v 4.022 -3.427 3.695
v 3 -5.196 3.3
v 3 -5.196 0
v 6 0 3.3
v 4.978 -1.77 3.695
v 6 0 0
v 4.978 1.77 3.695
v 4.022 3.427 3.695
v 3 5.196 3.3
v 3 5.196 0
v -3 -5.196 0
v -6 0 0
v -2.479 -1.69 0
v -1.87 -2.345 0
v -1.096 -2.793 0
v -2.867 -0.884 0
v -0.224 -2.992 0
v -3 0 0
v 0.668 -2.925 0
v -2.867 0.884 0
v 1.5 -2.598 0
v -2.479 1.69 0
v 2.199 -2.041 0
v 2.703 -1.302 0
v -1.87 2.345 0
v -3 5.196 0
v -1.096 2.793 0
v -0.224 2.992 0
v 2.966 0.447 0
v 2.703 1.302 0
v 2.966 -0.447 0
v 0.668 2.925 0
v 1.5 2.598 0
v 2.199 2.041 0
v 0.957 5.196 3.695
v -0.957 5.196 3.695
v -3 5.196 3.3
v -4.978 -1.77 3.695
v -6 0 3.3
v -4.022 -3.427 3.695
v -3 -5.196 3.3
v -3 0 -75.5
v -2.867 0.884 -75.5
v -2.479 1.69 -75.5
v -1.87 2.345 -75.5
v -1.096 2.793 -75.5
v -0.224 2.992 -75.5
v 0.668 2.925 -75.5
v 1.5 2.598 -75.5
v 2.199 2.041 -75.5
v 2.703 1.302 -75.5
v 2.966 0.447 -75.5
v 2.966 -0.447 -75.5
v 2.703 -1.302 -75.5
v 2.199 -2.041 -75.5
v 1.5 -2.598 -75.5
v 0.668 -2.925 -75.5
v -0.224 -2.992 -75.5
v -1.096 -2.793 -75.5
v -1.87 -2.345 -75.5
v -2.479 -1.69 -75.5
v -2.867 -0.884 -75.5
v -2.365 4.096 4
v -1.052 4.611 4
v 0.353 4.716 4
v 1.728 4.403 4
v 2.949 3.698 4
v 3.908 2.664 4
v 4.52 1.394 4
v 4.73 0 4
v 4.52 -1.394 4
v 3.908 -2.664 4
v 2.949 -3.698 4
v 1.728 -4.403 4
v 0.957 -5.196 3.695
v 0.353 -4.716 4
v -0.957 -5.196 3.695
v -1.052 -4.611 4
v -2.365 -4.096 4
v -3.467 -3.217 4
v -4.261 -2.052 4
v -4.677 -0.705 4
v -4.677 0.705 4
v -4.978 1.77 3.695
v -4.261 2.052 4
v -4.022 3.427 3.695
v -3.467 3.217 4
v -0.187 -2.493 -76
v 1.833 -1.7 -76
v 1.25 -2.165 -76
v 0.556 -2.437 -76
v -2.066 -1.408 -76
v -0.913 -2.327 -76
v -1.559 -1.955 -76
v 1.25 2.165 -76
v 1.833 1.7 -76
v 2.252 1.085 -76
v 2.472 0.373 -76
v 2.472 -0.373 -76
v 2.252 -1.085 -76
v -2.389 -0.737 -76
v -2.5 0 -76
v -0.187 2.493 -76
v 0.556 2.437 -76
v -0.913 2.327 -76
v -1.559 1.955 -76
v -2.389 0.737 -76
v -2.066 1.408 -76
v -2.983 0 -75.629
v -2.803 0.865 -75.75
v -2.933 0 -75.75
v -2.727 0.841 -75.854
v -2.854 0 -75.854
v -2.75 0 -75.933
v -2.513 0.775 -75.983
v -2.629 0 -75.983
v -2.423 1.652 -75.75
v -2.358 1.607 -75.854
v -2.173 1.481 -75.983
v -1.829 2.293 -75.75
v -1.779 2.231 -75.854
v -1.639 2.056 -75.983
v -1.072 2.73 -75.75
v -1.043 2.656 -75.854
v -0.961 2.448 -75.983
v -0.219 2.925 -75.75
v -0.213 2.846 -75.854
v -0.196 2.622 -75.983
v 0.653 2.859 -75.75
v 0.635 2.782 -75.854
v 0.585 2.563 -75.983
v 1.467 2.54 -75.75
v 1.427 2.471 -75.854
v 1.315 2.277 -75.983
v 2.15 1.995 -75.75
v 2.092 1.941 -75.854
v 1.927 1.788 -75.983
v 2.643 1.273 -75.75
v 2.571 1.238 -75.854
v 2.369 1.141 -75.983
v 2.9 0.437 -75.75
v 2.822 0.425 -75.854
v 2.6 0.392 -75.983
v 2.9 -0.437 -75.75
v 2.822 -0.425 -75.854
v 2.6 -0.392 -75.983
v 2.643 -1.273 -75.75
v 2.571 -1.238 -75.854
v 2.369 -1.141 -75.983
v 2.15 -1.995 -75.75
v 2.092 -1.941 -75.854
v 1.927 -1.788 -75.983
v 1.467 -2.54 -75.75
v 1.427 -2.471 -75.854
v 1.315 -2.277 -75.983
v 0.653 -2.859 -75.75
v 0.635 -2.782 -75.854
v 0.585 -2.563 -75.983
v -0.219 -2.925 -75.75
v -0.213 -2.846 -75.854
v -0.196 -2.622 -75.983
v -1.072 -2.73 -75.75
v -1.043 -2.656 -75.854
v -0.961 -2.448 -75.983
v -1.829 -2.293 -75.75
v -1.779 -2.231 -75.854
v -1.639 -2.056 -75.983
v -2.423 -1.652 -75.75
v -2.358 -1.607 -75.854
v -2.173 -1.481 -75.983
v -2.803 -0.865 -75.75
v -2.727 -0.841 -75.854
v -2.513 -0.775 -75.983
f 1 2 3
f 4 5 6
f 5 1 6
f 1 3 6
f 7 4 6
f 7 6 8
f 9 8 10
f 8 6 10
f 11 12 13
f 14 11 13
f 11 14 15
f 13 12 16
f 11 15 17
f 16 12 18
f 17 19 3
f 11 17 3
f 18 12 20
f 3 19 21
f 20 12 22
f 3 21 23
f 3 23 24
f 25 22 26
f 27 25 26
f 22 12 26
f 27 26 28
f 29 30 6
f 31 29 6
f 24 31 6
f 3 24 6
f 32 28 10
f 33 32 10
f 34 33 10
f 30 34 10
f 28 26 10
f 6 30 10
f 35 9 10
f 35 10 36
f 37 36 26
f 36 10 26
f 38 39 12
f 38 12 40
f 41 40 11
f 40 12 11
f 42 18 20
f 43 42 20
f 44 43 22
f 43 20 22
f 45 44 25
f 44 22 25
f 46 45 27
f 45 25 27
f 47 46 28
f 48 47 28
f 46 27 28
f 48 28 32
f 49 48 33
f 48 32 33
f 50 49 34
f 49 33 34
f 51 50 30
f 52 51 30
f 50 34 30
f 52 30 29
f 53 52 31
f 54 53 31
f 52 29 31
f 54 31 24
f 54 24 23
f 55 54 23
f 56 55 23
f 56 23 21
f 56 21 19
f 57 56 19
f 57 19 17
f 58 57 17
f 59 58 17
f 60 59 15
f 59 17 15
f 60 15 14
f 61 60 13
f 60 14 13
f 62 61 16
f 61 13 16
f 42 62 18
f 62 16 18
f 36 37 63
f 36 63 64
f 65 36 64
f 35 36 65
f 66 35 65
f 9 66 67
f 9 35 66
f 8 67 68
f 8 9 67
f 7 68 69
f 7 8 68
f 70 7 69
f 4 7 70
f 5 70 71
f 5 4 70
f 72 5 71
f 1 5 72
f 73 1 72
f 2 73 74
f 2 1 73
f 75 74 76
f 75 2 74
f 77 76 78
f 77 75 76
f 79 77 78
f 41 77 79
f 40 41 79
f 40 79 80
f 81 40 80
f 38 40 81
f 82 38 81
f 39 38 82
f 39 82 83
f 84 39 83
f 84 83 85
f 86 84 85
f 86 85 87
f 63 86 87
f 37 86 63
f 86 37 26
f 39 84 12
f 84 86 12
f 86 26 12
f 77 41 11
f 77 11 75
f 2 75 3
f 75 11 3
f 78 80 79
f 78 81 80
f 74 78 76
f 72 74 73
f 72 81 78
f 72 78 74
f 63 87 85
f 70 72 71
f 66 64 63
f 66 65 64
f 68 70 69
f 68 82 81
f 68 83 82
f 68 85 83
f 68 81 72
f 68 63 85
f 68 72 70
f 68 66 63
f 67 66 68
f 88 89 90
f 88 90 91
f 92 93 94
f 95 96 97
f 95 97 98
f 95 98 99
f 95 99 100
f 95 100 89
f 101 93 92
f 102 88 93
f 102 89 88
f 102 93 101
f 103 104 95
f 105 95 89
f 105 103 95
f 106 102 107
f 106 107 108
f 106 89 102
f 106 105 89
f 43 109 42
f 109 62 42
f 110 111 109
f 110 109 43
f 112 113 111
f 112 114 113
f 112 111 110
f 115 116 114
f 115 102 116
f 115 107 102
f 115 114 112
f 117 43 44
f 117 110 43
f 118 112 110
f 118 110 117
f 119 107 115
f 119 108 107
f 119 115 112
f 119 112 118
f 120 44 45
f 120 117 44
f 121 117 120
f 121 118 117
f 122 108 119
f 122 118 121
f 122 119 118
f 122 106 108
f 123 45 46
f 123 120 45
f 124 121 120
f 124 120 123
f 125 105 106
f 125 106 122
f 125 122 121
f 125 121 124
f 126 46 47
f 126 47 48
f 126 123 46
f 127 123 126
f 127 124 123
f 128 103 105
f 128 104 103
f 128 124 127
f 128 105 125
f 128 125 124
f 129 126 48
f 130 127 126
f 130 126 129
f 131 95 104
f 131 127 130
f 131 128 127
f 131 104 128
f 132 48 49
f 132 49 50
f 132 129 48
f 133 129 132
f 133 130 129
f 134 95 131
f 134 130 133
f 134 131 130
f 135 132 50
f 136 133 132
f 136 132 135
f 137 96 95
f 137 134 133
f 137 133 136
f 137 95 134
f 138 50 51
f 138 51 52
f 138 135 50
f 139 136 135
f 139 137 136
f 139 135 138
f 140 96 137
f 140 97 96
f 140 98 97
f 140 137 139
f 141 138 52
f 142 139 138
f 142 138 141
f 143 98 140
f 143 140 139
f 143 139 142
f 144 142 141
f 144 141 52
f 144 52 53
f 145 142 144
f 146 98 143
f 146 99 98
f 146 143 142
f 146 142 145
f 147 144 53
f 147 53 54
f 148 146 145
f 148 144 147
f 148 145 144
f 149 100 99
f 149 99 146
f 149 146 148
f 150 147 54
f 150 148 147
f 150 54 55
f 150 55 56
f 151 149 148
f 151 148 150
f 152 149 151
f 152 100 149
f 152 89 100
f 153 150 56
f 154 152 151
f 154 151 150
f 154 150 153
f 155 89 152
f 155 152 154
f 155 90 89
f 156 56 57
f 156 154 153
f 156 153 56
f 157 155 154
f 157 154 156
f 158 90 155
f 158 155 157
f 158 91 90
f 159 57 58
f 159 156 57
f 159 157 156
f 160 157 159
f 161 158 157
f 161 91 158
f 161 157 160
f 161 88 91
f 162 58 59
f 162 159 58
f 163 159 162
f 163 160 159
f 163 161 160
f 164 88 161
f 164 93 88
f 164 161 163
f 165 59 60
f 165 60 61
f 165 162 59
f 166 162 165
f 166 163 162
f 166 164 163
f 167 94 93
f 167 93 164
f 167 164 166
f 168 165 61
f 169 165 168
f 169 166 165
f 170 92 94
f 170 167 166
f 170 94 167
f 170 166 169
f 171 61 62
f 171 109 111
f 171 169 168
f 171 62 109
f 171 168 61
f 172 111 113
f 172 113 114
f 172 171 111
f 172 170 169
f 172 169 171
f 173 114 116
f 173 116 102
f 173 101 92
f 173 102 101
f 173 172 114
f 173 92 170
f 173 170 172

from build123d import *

# Parameters (mm, degrees)
BOSS_EXTRUDE1_DEPTH = 4
SKETCH5_R           = 3
BOSS_EXTRUDE2_DEPTH = 76
FILLET1_R           = 0.5


with BuildPart() as part:
    # Sketch1 → Boss-Extrude1 (new body)
    with BuildSketch(Plane.XY):
        Polygon((6, 0), (3, 5.196152423), (-3, 5.196152423), (-6, 0), (-3, -5.196152423), (3, -5.196152423), align=None)
    extrude(amount=BOSS_EXTRUDE1_DEPTH)

    # Sketch4 → Cut-Revolve1 (revolve, cut)
    with BuildSketch(Plane(origin=(0, 0, 0), x_dir=(0, 0, -1), z_dir=(0.866025404, 0.5, 0))):
        Polygon((-4, 4.729715048), (-3.3, 6), (-4, 6), align=None)
    revolve(axis=Axis((0, 0, 6.225223698), (0, 0, -1)), mode=Mode.SUBTRACT)

    # Sketch5 → Boss-Extrude2 (add)
    with BuildSketch(Plane(origin=(0, 0, 0), x_dir=(-1, 0, 0), z_dir=(0, 0, -1))):
        Circle(SKETCH5_R)
    extrude(amount=BOSS_EXTRUDE2_DEPTH)

    # Fillet1
    fillet1_edges = [part.edges().sort_by_distance(p)[0] for p in [
        (3, 0, -76),
    ]]
    fillet(fillet1_edges, radius=FILLET1_R)


solid = part.part
